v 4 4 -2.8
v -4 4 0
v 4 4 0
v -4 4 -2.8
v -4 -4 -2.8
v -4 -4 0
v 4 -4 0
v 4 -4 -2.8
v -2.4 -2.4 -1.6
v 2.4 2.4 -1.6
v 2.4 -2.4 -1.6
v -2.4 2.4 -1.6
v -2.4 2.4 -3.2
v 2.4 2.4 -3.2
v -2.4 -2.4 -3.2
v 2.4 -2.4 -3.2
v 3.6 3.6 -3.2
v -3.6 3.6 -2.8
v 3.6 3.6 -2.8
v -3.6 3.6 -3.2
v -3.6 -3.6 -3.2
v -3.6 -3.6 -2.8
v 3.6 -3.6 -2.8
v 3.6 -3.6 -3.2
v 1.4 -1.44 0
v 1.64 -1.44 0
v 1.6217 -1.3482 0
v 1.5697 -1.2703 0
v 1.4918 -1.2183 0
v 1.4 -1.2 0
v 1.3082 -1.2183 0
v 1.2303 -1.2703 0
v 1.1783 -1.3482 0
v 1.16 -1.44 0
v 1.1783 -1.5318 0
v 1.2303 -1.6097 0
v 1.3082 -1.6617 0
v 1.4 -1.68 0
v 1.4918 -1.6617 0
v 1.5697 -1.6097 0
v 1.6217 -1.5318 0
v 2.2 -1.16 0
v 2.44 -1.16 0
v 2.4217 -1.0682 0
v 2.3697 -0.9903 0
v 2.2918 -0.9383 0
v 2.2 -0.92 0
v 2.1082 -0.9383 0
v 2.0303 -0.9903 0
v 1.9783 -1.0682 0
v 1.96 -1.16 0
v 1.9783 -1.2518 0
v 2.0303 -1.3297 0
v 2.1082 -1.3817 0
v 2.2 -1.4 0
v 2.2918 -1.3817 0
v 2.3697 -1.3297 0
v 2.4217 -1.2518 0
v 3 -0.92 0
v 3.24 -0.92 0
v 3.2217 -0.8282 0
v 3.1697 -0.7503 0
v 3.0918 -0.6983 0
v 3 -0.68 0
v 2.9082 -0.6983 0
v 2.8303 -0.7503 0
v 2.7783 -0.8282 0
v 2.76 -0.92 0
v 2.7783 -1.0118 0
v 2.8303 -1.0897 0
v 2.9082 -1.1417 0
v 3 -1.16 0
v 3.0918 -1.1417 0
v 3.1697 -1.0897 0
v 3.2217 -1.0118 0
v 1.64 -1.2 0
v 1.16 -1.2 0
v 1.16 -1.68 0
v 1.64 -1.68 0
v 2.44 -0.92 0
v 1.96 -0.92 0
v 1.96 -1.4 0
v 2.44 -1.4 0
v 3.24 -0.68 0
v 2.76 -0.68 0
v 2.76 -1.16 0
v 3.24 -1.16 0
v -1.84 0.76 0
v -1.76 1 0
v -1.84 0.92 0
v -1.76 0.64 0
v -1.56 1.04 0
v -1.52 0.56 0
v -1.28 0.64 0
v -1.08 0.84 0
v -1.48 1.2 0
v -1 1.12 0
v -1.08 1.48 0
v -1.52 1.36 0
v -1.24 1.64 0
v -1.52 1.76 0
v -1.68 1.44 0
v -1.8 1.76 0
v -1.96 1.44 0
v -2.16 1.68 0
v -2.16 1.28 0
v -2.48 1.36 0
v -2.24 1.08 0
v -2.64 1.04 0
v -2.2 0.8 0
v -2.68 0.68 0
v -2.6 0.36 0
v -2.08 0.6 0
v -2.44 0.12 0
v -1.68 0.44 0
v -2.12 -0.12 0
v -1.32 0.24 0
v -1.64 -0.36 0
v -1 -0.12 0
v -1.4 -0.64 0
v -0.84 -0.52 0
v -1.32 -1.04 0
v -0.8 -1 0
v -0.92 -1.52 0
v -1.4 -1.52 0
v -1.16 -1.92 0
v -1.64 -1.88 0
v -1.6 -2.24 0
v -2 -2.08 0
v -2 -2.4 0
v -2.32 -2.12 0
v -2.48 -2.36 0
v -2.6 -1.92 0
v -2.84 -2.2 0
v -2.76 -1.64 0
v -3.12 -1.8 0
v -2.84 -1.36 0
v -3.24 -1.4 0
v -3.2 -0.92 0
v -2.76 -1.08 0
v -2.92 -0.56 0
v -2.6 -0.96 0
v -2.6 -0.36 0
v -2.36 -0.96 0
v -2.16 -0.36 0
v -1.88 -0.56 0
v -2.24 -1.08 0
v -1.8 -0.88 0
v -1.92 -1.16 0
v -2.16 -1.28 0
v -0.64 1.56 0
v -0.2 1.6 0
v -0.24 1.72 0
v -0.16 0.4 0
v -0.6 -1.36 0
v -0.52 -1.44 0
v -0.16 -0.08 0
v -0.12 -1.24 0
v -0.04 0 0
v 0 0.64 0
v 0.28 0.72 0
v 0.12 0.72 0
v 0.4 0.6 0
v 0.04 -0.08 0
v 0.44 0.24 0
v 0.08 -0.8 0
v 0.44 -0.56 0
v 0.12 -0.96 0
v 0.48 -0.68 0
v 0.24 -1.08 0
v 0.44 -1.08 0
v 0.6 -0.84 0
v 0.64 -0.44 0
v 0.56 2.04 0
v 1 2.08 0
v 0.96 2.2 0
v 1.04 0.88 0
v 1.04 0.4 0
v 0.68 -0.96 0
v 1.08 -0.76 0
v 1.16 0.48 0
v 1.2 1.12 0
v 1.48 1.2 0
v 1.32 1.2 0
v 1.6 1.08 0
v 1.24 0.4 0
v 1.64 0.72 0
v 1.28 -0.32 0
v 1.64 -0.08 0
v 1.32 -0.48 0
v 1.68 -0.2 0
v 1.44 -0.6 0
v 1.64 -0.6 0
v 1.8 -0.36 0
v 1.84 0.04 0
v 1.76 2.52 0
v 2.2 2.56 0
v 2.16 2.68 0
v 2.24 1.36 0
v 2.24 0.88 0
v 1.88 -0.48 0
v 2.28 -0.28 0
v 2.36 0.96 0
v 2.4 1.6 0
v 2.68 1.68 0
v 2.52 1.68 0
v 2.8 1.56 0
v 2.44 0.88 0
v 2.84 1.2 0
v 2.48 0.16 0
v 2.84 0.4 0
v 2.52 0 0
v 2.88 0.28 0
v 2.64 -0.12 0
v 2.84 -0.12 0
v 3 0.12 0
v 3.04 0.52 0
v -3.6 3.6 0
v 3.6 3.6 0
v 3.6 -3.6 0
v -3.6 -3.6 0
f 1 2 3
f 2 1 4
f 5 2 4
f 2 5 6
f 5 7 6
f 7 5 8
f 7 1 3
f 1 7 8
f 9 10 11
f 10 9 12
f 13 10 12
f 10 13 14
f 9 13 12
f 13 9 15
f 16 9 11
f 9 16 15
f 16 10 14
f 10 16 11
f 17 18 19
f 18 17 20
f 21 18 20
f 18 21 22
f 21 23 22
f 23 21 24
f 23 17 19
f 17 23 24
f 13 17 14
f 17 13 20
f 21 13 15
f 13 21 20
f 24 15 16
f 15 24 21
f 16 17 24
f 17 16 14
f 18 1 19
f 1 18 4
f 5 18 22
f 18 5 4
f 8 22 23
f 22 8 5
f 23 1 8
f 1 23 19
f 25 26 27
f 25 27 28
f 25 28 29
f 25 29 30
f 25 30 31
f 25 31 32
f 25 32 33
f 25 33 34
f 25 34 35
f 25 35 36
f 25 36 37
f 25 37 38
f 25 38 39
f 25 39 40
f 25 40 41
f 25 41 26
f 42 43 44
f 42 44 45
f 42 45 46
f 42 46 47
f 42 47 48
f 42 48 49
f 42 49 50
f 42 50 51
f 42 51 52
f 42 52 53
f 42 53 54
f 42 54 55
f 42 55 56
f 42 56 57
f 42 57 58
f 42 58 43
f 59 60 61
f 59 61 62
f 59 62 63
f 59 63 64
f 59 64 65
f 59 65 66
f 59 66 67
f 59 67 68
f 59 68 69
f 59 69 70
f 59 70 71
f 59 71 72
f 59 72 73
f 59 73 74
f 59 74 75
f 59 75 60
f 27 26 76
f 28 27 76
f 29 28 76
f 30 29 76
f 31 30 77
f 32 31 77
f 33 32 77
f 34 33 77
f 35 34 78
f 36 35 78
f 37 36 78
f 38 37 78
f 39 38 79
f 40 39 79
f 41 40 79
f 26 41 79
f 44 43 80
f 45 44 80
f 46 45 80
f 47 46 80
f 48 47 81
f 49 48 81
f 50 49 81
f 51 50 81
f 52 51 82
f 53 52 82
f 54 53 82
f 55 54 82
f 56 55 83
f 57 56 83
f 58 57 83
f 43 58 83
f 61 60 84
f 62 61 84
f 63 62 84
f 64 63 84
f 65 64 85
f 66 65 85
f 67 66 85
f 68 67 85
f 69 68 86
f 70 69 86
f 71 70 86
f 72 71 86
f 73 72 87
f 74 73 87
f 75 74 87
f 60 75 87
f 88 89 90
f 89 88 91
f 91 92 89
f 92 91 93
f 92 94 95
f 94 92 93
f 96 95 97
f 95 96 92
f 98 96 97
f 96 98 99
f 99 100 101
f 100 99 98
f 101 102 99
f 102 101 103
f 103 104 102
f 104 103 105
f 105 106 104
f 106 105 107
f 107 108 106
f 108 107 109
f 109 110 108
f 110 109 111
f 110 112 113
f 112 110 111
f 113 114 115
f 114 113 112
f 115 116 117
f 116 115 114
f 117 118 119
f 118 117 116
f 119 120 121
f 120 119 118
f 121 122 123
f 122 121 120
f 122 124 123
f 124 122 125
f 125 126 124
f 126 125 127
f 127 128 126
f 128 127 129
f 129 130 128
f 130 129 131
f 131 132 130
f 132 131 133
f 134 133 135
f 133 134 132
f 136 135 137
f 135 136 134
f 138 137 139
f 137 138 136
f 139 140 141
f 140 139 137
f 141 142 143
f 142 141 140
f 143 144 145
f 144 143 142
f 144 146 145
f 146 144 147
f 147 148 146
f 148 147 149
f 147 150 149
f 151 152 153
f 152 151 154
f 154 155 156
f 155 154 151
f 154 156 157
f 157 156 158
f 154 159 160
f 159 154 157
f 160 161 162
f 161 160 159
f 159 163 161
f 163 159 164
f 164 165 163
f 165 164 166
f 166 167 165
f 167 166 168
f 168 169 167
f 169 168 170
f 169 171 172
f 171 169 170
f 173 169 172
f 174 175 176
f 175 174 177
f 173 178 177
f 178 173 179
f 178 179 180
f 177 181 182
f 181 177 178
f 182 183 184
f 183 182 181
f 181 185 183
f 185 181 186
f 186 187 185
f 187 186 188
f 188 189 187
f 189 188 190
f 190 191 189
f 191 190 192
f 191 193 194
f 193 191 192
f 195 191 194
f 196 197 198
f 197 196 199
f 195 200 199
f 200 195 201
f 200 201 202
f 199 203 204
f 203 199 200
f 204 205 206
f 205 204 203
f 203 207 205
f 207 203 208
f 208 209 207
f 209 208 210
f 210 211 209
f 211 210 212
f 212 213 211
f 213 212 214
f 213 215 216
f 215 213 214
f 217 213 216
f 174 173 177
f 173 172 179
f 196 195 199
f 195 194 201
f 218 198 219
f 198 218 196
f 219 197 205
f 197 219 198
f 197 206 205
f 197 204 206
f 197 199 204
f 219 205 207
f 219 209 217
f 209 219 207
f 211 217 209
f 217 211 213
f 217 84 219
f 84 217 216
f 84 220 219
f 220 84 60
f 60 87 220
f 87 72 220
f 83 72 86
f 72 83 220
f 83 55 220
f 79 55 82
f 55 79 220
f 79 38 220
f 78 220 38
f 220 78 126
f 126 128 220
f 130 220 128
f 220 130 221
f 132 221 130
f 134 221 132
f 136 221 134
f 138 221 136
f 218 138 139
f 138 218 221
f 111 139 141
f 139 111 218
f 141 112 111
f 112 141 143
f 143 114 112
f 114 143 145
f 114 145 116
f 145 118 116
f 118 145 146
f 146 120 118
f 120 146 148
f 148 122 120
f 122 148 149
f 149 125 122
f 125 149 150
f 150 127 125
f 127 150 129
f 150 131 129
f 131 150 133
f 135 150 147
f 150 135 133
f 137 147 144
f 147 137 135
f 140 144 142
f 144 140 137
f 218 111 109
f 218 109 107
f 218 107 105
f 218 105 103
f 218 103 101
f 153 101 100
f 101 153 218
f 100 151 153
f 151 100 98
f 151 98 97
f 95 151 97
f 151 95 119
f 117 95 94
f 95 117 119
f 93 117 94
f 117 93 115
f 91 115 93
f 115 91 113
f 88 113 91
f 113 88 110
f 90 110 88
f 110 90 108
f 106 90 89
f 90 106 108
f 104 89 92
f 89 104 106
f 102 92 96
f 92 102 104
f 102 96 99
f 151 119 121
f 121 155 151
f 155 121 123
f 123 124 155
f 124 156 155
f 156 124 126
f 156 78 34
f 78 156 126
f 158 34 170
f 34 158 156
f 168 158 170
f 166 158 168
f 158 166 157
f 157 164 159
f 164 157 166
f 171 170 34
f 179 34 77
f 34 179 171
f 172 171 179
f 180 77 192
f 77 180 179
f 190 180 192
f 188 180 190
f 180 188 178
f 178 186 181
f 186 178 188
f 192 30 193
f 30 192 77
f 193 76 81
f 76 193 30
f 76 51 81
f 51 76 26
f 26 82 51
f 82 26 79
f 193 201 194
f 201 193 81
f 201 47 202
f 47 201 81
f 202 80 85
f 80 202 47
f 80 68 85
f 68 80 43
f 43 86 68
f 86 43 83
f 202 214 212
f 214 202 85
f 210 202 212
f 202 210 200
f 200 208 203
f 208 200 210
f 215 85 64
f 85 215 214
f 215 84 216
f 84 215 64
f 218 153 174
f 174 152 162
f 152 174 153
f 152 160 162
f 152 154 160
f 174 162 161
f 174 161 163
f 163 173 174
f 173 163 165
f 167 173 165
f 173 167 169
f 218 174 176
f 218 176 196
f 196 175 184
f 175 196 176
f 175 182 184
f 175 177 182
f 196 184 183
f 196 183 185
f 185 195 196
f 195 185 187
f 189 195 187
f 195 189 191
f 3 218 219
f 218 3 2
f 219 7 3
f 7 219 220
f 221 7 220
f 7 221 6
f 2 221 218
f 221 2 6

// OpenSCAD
// file: ../p/box5.scad
use <../lib.scad>
function ldraw_lib__box5() = [
// 0 Box with 5 Faces and All Edges
// 0 Name: box5.dat
// 0 Author: James Jessiman
// 0 !LDRAW_ORG Primitive UPDATE 2012-01
// 0 !LICENSE Licensed under CC BY 4.0 : see CAreadme.txt
// 
// 0 BFC CERTIFY CCW
  [0,"BFC","CERTIFY"],
  [0,"BFC","CCW"],
// 
// 0 !HISTORY 2002-04-03 [sbliss] Modified for BFC compliance
// 0 !HISTORY 2002-04-25 [PTadmin] Official Update 2002-02
// 0 !HISTORY 2007-06-24 [PTadmin] Header formatted for Contributor Agreement
// 0 !HISTORY 2008-07-01 [PTadmin] Official Update 2008-01
// 0 !HISTORY 2012-02-16 [Philo] Changed to CCW
// 0 !HISTORY 2012-03-30 [PTadmin] Official Update 2012-01
// 
// 
// 2 24 1 1 1 -1 1 1
  [2,24,1,1,1,-1,1,1],
// 2 24 -1 1 1 -1 1 -1
  [2,24,-1,1,1,-1,1,-1],
// 2 24 -1 1 -1 1 1 -1
  [2,24,-1,1,-1,1,1,-1],
// 2 24 1 1 -1 1 1 1
  [2,24,1,1,-1,1,1,1],
// 2 24 1 0 1 -1 0 1
  [2,24,1,0,1,-1,0,1],
// 2 24 -1 0 1 -1 0 -1
  [2,24,-1,0,1,-1,0,-1],
// 2 24 -1 0 -1 1 0 -1
  [2,24,-1,0,-1,1,0,-1],
// 2 24 1 0 -1 1 0 1
  [2,24,1,0,-1,1,0,1],
// 2 24 1 0 1 1 1 1
  [2,24,1,0,1,1,1,1],
// 2 24 -1 0 1 -1 1 1
  [2,24,-1,0,1,-1,1,1],
// 2 24 1 0 -1 1 1 -1
  [2,24,1,0,-1,1,1,-1],
// 2 24 -1 0 -1 -1 1 -1
  [2,24,-1,0,-1,-1,1,-1],
// 4 16 -1 1 1 1 1 1 1 1 -1 -1 1 -1
  [4,16,-1,1,1,1,1,1,1,1,-1,-1,1,-1],
// 4 16 -1 1 1 -1 0 1 1 0 1 1 1 1
  [4,16,-1,1,1,-1,0,1,1,0,1,1,1,1],
// 4 16 -1 1 -1 -1 0 -1 -1 0 1 -1 1 1
  [4,16,-1,1,-1,-1,0,-1,-1,0,1,-1,1,1],
// 4 16 1 1 -1 1 0 -1 -1 0 -1 -1 1 -1
  [4,16,1,1,-1,1,0,-1,-1,0,-1,-1,1,-1],
// 4 16 1 1 1 1 0 1 1 0 -1 1 1 -1
  [4,16,1,1,1,1,0,1,1,0,-1,1,1,-1],
];
module ldraw_lib__box5(step=0, col=false, unit=2/5, alt=false, line=0.2, solid=!$preview)
    makepoly(ldraw_lib__box5(), step=step, col=col, unit=unit, alt=alt, line=line, solid=solid);
ldraw_lib__box5(line=0.2);
// file: ../p/box4.scad
use <../lib.scad>
function ldraw_lib__box4() = [
// 0 Box with 4 Faces (2 Parallel Pairs) and All Edges
// 0 Name: box4.dat
// 0 Author: James Jessiman
// 0 !LDRAW_ORG Primitive UPDATE 2012-01
// 0 !LICENSE Licensed under CC BY 4.0 : see CAreadme.txt
// 
// 0 BFC CERTIFY CCW
  [0,"BFC","CERTIFY"],
  [0,"BFC","CCW"],
// 
// 0 !HISTORY 2002-04-03 [sbliss] Modified for BFC compliance
// 0 !HISTORY 2002-04-25 [PTadmin] Official Update 2002-02
// 0 !HISTORY 2007-06-24 [PTadmin] Header formatted for Contributor Agreement
// 0 !HISTORY 2008-07-01 [PTadmin] Official Update 2008-01
// 0 !HISTORY 2012-02-16 [Philo] Changed to CCW
// 0 !HISTORY 2012-03-30 [PTadmin] Official Update 2012-01
// 
// 
// 2 24 1 1 1 -1 1 1
  [2,24,1,1,1,-1,1,1],
// 2 24 -1 1 1 -1 1 -1
  [2,24,-1,1,1,-1,1,-1],
// 2 24 -1 1 -1 1 1 -1
  [2,24,-1,1,-1,1,1,-1],
// 2 24 1 1 -1 1 1 1
  [2,24,1,1,-1,1,1,1],
// 2 24 1 0 1 -1 0 1
  [2,24,1,0,1,-1,0,1],
// 2 24 -1 0 1 -1 0 -1
  [2,24,-1,0,1,-1,0,-1],
// 2 24 -1 0 -1 1 0 -1
  [2,24,-1,0,-1,1,0,-1],
// 2 24 1 0 -1 1 0 1
  [2,24,1,0,-1,1,0,1],
// 2 24 1 0 1 1 1 1
  [2,24,1,0,1,1,1,1],
// 2 24 -1 0 1 -1 1 1
  [2,24,-1,0,1,-1,1,1],
// 2 24 1 0 -1 1 1 -1
  [2,24,1,0,-1,1,1,-1],
// 2 24 -1 0 -1 -1 1 -1
  [2,24,-1,0,-1,-1,1,-1],
// 4 16 -1 1 1 -1 0 1 1 0 1 1 1 1
  [4,16,-1,1,1,-1,0,1,1,0,1,1,1,1],
// 4 16 -1 1 -1 -1 0 -1 -1 0 1 -1 1 1
  [4,16,-1,1,-1,-1,0,-1,-1,0,1,-1,1,1],
// 4 16 1 1 -1 1 0 -1 -1 0 -1 -1 1 -1
  [4,16,1,1,-1,1,0,-1,-1,0,-1,-1,1,-1],
// 4 16 1 1 1 1 0 1 1 0 -1 1 1 -1
  [4,16,1,1,1,1,0,1,1,0,-1,1,1,-1],
];
module ldraw_lib__box4(step=0, col=false, unit=2/5, alt=false, line=0.2, solid=!$preview)
    makepoly(ldraw_lib__box4(), step=step, col=col, unit=unit, alt=alt, line=line, solid=solid);
ldraw_lib__box4(line=0.2);
// file: s/3070bs01.scad
use <../../lib.scad>
use <../../p/box4.scad>
use <../../p/box5.scad>
function ldraw_lib__s__3070bs01() = [
// 0 ~Tile  1 x  1 with Groove without Top Face
// 0 Name: s\3070bs01.dat
// 0 Author: Chris Dee [cwdee]
// 0 !LDRAW_ORG Subpart UPDATE 2009-02
// 0 !LICENSE Licensed under CC BY 4.0 : see CAreadme.txt
// 
// 0 BFC CERTIFY CCW
  [0,"BFC","CERTIFY"],
  [0,"BFC","CCW"],
// 
// 0 !HISTORY 2009-09-03 [PTadmin] Official Update 2009-02
// 
// 
// 1 16 0 0 0 10 0 0 0 7 0 0 0 10 box4.dat
  [1,16,0,0,0,10,0,0,0,7,0,0,0,10, ldraw_lib__box4()],
// 0 BFC INVERTNEXT
  [0,"BFC","INVERTNEXT"],
// 1 16 0 8 0 6 0 0 0 -4 0 0 0 6 box5.dat
  [1,16,0,8,0,6,0,0,0,-4,0,0,0,6, ldraw_lib__box5()],
// 1 16 0 7 0 9 0 0 0 1 0 0 0 9 box4.dat
  [1,16,0,7,0,9,0,0,0,1,0,0,0,9, ldraw_lib__box4()],
// 
// 4 16 9 8 9 6 8 6 -6 8 6 -9 8 9
  [4,16,9,8,9,6,8,6,-6,8,6,-9,8,9],
// 4 16 -9 8 9 -6 8 6 -6 8 -6 -9 8 -9
  [4,16,-9,8,9,-6,8,6,-6,8,-6,-9,8,-9],
// 4 16 -9 8 -9 -6 8 -6 6 8 -6 9 8 -9
  [4,16,-9,8,-9,-6,8,-6,6,8,-6,9,8,-9],
// 4 16 9 8 -9 6 8 -6 6 8 6 9 8 9
  [4,16,9,8,-9,6,8,-6,6,8,6,9,8,9],
// 
// 4 16 10 7 10 9 7 9 -9 7 9 -10 7 10
  [4,16,10,7,10,9,7,9,-9,7,9,-10,7,10],
// 4 16 -10 7 10 -9 7 9 -9 7 -9 -10 7 -10
  [4,16,-10,7,10,-9,7,9,-9,7,-9,-10,7,-10],
// 4 16 -10 7 -10 -9 7 -9 9 7 -9 10 7 -10
  [4,16,-10,7,-10,-9,7,-9,9,7,-9,10,7,-10],
// 4 16 10 7 -10 9 7 -9 9 7 9 10 7 10
  [4,16,10,7,-10,9,7,-9,9,7,9,10,7,10],
// 0
];
module ldraw_lib__s__3070bs01(step=0, col=false, unit=2/5, alt=false, line=0.2, solid=!$preview)
    makepoly(ldraw_lib__s__3070bs01(), step=step, col=col, unit=unit, alt=alt, line=line, solid=solid);
ldraw_lib__s__3070bs01(line=0.2);
// file: ../p/4-4ndis.scad
use <../lib.scad>
function ldraw_lib__4_4ndis() = [
// 0 Disc Negative 1.0
// 0 Name: 4-4ndis.dat
// 0 Author: James Jessiman
// 0 !LDRAW_ORG Primitive UPDATE 2012-01
// 0 !LICENSE Licensed under CC BY 4.0 : see CAreadme.txt
// 
// 0 BFC CERTIFY CCW
  [0,"BFC","CERTIFY"],
  [0,"BFC","CCW"],
// 
// 0 !HISTORY 2002-03-23 [sbliss] Added BFC statement; compacted code
// 0 !HISTORY 2002-04-25 [PTadmin] Official Update 2002-02
// 0 !HISTORY 2007-06-24 [PTadmin] Header formatted for Contributor Agreement
// 0 !HISTORY 2008-07-01 [PTadmin] Official Update 2008-01
// 0 !HISTORY 2012-02-16 [Philo] Changed to CCW
// 0 !HISTORY 2012-03-30 [PTadmin] Official Update 2012-01
// 
// 
// 3 16 0.9239 0 0.3827 1 0 0 1 0 1
  [3,16,0.9239,0,0.3827,1,0,0,1,0,1],
// 3 16 0.7071 0 0.7071 0.9239 0 0.3827 1 0 1
  [3,16,0.7071,0,0.7071,0.9239,0,0.3827,1,0,1],
// 3 16 0.3827 0 0.9239 0.7071 0 0.7071 1 0 1
  [3,16,0.3827,0,0.9239,0.7071,0,0.7071,1,0,1],
// 3 16 0 0 1 0.3827 0 0.9239 1 0 1
  [3,16,0,0,1,0.3827,0,0.9239,1,0,1],
// 3 16 -0.3827 0 0.9239 0 0 1 -1 0 1
  [3,16,-0.3827,0,0.9239,0,0,1,-1,0,1],
// 3 16 -0.7071 0 0.7071 -0.3827 0 0.9239 -1 0 1
  [3,16,-0.7071,0,0.7071,-0.3827,0,0.9239,-1,0,1],
// 3 16 -0.9239 0 0.3827 -0.7071 0 0.7071 -1 0 1
  [3,16,-0.9239,0,0.3827,-0.7071,0,0.7071,-1,0,1],
// 3 16 -1 0 0 -0.9239 0 0.3827 -1 0 1
  [3,16,-1,0,0,-0.9239,0,0.3827,-1,0,1],
// 3 16 -0.9239 0 -0.3827 -1 0 0 -1 0 -1
  [3,16,-0.9239,0,-0.3827,-1,0,0,-1,0,-1],
// 3 16 -0.7071 0 -0.7071 -0.9239 0 -0.3827 -1 0 -1
  [3,16,-0.7071,0,-0.7071,-0.9239,0,-0.3827,-1,0,-1],
// 3 16 -0.3827 0 -0.9239 -0.7071 0 -0.7071 -1 0 -1
  [3,16,-0.3827,0,-0.9239,-0.7071,0,-0.7071,-1,0,-1],
// 3 16 0 0 -1 -0.3827 0 -0.9239 -1 0 -1
  [3,16,0,0,-1,-0.3827,0,-0.9239,-1,0,-1],
// 3 16 0.3827 0 -0.9239 0 0 -1 1 0 -1
  [3,16,0.3827,0,-0.9239,0,0,-1,1,0,-1],
// 3 16 0.7071 0 -0.7071 0.3827 0 -0.9239 1 0 -1
  [3,16,0.7071,0,-0.7071,0.3827,0,-0.9239,1,0,-1],
// 3 16 0.9239 0 -0.3827 0.7071 0 -0.7071 1 0 -1
  [3,16,0.9239,0,-0.3827,0.7071,0,-0.7071,1,0,-1],
// 3 16 1 0 0 0.9239 0 -0.3827 1 0 -1
  [3,16,1,0,0,0.9239,0,-0.3827,1,0,-1],
];
module ldraw_lib__4_4ndis(step=0, col=false, unit=2/5, alt=false, line=0.2, solid=!$preview)
    makepoly(ldraw_lib__4_4ndis(), step=step, col=col, unit=unit, alt=alt, line=line, solid=solid);
ldraw_lib__4_4ndis(line=0.2);
// file: ../p/4-4disc.scad
use <../lib.scad>
function ldraw_lib__4_4disc() = [
// 0 Disc 1.0
// 0 Name: 4-4disc.dat
// 0 Author: James Jessiman
// 0 !LDRAW_ORG Primitive UPDATE 2002-02
// 0 !LICENSE Licensed under CC BY 4.0 : see CAreadme.txt
// 
// 0 BFC CERTIFY CCW
  [0,"BFC","CERTIFY"],
  [0,"BFC","CCW"],
// 
// 0 !HISTORY 1998-12-15 [PTadmin] Official Update 1998-10
// 0 !HISTORY 2002-03-23 [sbliss] Added BFC statement
// 0 !HISTORY 2002-04-25 [PTadmin] Official Update 2002-02
// 0 !HISTORY 2007-06-24 [PTadmin] Header formatted for Contributor Agreement
// 0 !HISTORY 2008-07-01 [PTadmin] Official Update 2008-01
// 
// 
// 3 16 0 0 0 1 0 0 0.9239 0 0.3827
  [3,16,0,0,0,1,0,0,0.9239,0,0.3827],
// 3 16 0 0 0 0.9239 0 0.3827 0.7071 0 0.7071
  [3,16,0,0,0,0.9239,0,0.3827,0.7071,0,0.7071],
// 3 16 0 0 0 0.7071 0 0.7071 0.3827 0 0.9239
  [3,16,0,0,0,0.7071,0,0.7071,0.3827,0,0.9239],
// 3 16 0 0 0 0.3827 0 0.9239 0 0 1
  [3,16,0,0,0,0.3827,0,0.9239,0,0,1],
// 3 16 0 0 0 0 0 1 -0.3827 0 0.9239
  [3,16,0,0,0,0,0,1,-0.3827,0,0.9239],
// 3 16 0 0 0 -0.3827 0 0.9239 -0.7071 0 0.7071
  [3,16,0,0,0,-0.3827,0,0.9239,-0.7071,0,0.7071],
// 3 16 0 0 0 -0.7071 0 0.7071 -0.9239 0 0.3827
  [3,16,0,0,0,-0.7071,0,0.7071,-0.9239,0,0.3827],
// 3 16 0 0 0 -0.9239 0 0.3827 -1 0 -0
  [3,16,0,0,0,-0.9239,0,0.3827,-1,0,-0],
// 3 16 0 0 0 -1 0 -0 -0.9239 0 -0.3827
  [3,16,0,0,0,-1,0,-0,-0.9239,0,-0.3827],
// 3 16 0 0 0 -0.9239 0 -0.3827 -0.7071 0 -0.7071
  [3,16,0,0,0,-0.9239,0,-0.3827,-0.7071,0,-0.7071],
// 3 16 0 0 0 -0.7071 0 -0.7071 -0.3827 0 -0.9239
  [3,16,0,0,0,-0.7071,0,-0.7071,-0.3827,0,-0.9239],
// 3 16 0 0 0 -0.3827 0 -0.9239 0 0 -1
  [3,16,0,0,0,-0.3827,0,-0.9239,0,0,-1],
// 3 16 0 0 0 0 0 -1 0.3827 0 -0.9239
  [3,16,0,0,0,0,0,-1,0.3827,0,-0.9239],
// 3 16 0 0 0 0.3827 0 -0.9239 0.7071 0 -0.7071
  [3,16,0,0,0,0.3827,0,-0.9239,0.7071,0,-0.7071],
// 3 16 0 0 0 0.7071 0 -0.7071 0.9239 0 -0.3827
  [3,16,0,0,0,0.7071,0,-0.7071,0.9239,0,-0.3827],
// 3 16 0 0 0 0.9239 0 -0.3827 1 0 0
  [3,16,0,0,0,0.9239,0,-0.3827,1,0,0],
// 0
];
module ldraw_lib__4_4disc(step=0, col=false, unit=2/5, alt=false, line=0.2, solid=!$preview)
    makepoly(ldraw_lib__4_4disc(), step=step, col=col, unit=unit, alt=alt, line=line, solid=solid);
ldraw_lib__4_4disc(line=0.2);
// main file
use <../lib.scad>
use <../p/4-4disc.scad>
use <../p/4-4ndis.scad>
use <s/3070bs01.scad>
function ldraw_lib__3070bpt4() = [
// 0 Tile  1 x  1 with Bright Light Blue "Shhh..." on Medium Lavender Background Pattern
// 0 Name: 3070bpt4.dat
// 0 Author: Takeshi Takahashi [RainbowDolphin]
// 0 !LDRAW_ORG Part UPDATE 2025-10
// 0 !LICENSE Licensed under CC BY 4.0 : see CAreadme.txt
// 
// 0 BFC CERTIFY CCW
  [0,"BFC","CERTIFY"],
  [0,"BFC","CCW"],
// 
// 0 !KEYWORDS BrickLink 3070pb186, Dots, Extra, Rebrickable 3070bpr9989, Series 3
// 0 !KEYWORDS Set 41921
// 
// 0 !HISTORY 2025-10-27 [OrionP] Official Update 2025-10
// 
// 1 16 0 0 0 1 0 0 0 1 0 0 0 1 s\3070bs01.dat
  [1,16,0,0,0,1,0,0,0,1,0,0,0,1, ldraw_lib__s__3070bs01()],
// 1 212 3.5 0 -3.6 0.6 0 0 0 1 0 0 0 0.6 4-4disc.dat
  [1,212,3.5,0,-3.6,0.6,0,0,0,1,0,0,0,0.6, ldraw_lib__4_4disc()],
// 1 212 5.5 0 -2.9 0.6 0 0 0 1 0 0 0 0.6 4-4disc.dat
  [1,212,5.5,0,-2.9,0.6,0,0,0,1,0,0,0,0.6, ldraw_lib__4_4disc()],
// 1 212 7.5 0 -2.3 0.6 0 0 0 1 0 0 0 0.6 4-4disc.dat
  [1,212,7.5,0,-2.3,0.6,0,0,0,1,0,0,0,0.6, ldraw_lib__4_4disc()],
// 1 30 3.5 0 -3.6 0.6 0 0 0 1 0 0 0 0.6 4-4ndis.dat
  [1,30,3.5,0,-3.6,0.6,0,0,0,1,0,0,0,0.6, ldraw_lib__4_4ndis()],
// 1 30 5.5 0 -2.9 0.6 0 0 0 1 0 0 0 0.6 4-4ndis.dat
  [1,30,5.5,0,-2.9,0.6,0,0,0,1,0,0,0,0.6, ldraw_lib__4_4ndis()],
// 1 30 7.5 0 -2.3 0.6 0 0 0 1 0 0 0 0.6 4-4ndis.dat
  [1,30,7.5,0,-2.3,0.6,0,0,0,1,0,0,0,0.6, ldraw_lib__4_4ndis()],
// 4 212 -4.4 0 2.5 -4.6 0 2.3 -4.6 0 1.9 -4.4 0 1.6
  [4,212,-4.4,0,2.5,-4.6,0,2.3,-4.6,0,1.9,-4.4,0,1.6],
// 4 212 -4.4 0 2.5 -4.4 0 1.6 -3.8 0 1.4 -3.9 0 2.6
  [4,212,-4.4,0,2.5,-4.4,0,1.6,-3.8,0,1.4,-3.9,0,2.6],
// 4 212 -3.9 0 2.6 -3.8 0 1.4 -3.2 0 1.6 -2.7 0 2.1
  [4,212,-3.9,0,2.6,-3.8,0,1.4,-3.2,0,1.6,-2.7,0,2.1],
// 4 212 -3.7 0 3 -3.9 0 2.6 -2.7 0 2.1 -2.5 0 2.8
  [4,212,-3.7,0,3,-3.9,0,2.6,-2.7,0,2.1,-2.5,0,2.8],
// 4 212 -3.7 0 3 -2.5 0 2.8 -2.7 0 3.7 -3.8 0 3.4
  [4,212,-3.7,0,3,-2.5,0,2.8,-2.7,0,3.7,-3.8,0,3.4],
// 4 212 -3.8 0 3.4 -2.7 0 3.7 -3.1 0 4.1 -3.8 0 4.4
  [4,212,-3.8,0,3.4,-2.7,0,3.7,-3.1,0,4.1,-3.8,0,4.4],
// 4 212 -4.2 0 3.6 -3.8 0 3.4 -3.8 0 4.4 -4.5 0 4.4
  [4,212,-4.2,0,3.6,-3.8,0,3.4,-3.8,0,4.4,-4.5,0,4.4],
// 4 212 -4.9 0 3.6 -4.2 0 3.6 -4.5 0 4.4 -5.4 0 4.2
  [4,212,-4.9,0,3.6,-4.2,0,3.6,-4.5,0,4.4,-5.4,0,4.2],
// 4 212 -5.4 0 3.2 -4.9 0 3.6 -5.4 0 4.2 -6.2 0 3.4
  [4,212,-5.4,0,3.2,-4.9,0,3.6,-5.4,0,4.2,-6.2,0,3.4],
// 4 212 -5.6 0 2.7 -5.4 0 3.2 -6.2 0 3.4 -6.6 0 2.6
  [4,212,-5.6,0,2.7,-5.4,0,3.2,-6.2,0,3.4,-6.6,0,2.6],
// 4 212 -5.5 0 2 -5.6 0 2.7 -6.6 0 2.6 -6.7 0 1.7
  [4,212,-5.5,0,2,-5.6,0,2.7,-6.6,0,2.6,-6.7,0,1.7],
// 4 212 -5.5 0 2 -6.7 0 1.7 -6.5 0 0.9 -5.2 0 1.5
  [4,212,-5.5,0,2,-6.7,0,1.7,-6.5,0,0.9,-5.2,0,1.5],
// 4 212 -5.2 0 1.5 -6.5 0 0.9 -6.1 0 0.3 -4.2 0 1.1
  [4,212,-5.2,0,1.5,-6.5,0,0.9,-6.1,0,0.3,-4.2,0,1.1],
// 4 212 -4.2 0 1.1 -6.1 0 0.3 -5.3 0 -0.3 -3.3 0 0.6
  [4,212,-4.2,0,1.1,-6.1,0,0.3,-5.3,0,-0.3,-3.3,0,0.6],
// 4 212 -3.3 0 0.6 -5.3 0 -0.3 -4.1 0 -0.9 -2.5 0 -0.3
  [4,212,-3.3,0,0.6,-5.3,0,-0.3,-4.1,0,-0.9,-2.5,0,-0.3],
// 4 212 -2.5 0 -0.3 -4.1 0 -0.9 -3.5 0 -1.6 -2.1 0 -1.3
  [4,212,-2.5,0,-0.3,-4.1,0,-0.9,-3.5,0,-1.6,-2.1,0,-1.3],
// 4 212 -2 0 -2.5 -2.1 0 -1.3 -3.5 0 -1.6 -3.3 0 -2.6
  [4,212,-2,0,-2.5,-2.1,0,-1.3,-3.5,0,-1.6,-3.3,0,-2.6],
// 4 212 -2.3 0 -3.8 -2 0 -2.5 -3.3 0 -2.6 -3.5 0 -3.8
  [4,212,-2.3,0,-3.8,-2,0,-2.5,-3.3,0,-2.6,-3.5,0,-3.8],
// 4 212 -2.9 0 -4.8 -2.3 0 -3.8 -3.5 0 -3.8 -4.1 0 -4.7
  [4,212,-2.9,0,-4.8,-2.3,0,-3.8,-3.5,0,-3.8,-4.1,0,-4.7],
// 4 212 -4 0 -5.6 -2.9 0 -4.8 -4.1 0 -4.7 -5 0 -5.2
  [4,212,-4,0,-5.6,-2.9,0,-4.8,-4.1,0,-4.7,-5,0,-5.2],
// 4 212 -5 0 -6 -4 0 -5.6 -5 0 -5.2 -5.8 0 -5.3
  [4,212,-5,0,-6,-4,0,-5.6,-5,0,-5.2,-5.8,0,-5.3],
// 4 212 -6.2 0 -5.9 -5 0 -6 -5.8 0 -5.3 -6.5 0 -4.8
  [4,212,-6.2,0,-5.9,-5,0,-6,-5.8,0,-5.3,-6.5,0,-4.8],
// 4 212 -7.1 0 -5.5 -6.2 0 -5.9 -6.5 0 -4.8 -6.9 0 -4.1
  [4,212,-7.1,0,-5.5,-6.2,0,-5.9,-6.5,0,-4.8,-6.9,0,-4.1],
// 4 212 -7.8 0 -4.5 -7.1 0 -5.5 -6.9 0 -4.1 -7.1 0 -3.4
  [4,212,-7.8,0,-4.5,-7.1,0,-5.5,-6.9,0,-4.1,-7.1,0,-3.4],
// 4 212 -8.1 0 -3.5 -7.8 0 -4.5 -7.1 0 -3.4 -8 0 -2.3
  [4,212,-8.1,0,-3.5,-7.8,0,-4.5,-7.1,0,-3.4,-8,0,-2.3],
// 4 212 -8 0 -2.3 -7.1 0 -3.4 -6.9 0 -2.7 -7.3 0 -1.4
  [4,212,-8,0,-2.3,-7.1,0,-3.4,-6.9,0,-2.7,-7.3,0,-1.4],
// 4 212 -7.3 0 -1.4 -6.9 0 -2.7 -6.5 0 -2.4 -6.5 0 -0.9
  [4,212,-7.3,0,-1.4,-6.9,0,-2.7,-6.5,0,-2.4,-6.5,0,-0.9],
// 4 212 -6.5 0 -0.9 -6.5 0 -2.4 -5.9 0 -2.4 -5.4 0 -0.9
  [4,212,-6.5,0,-0.9,-6.5,0,-2.4,-5.9,0,-2.4,-5.4,0,-0.9],
// 4 212 -4.7 0 -1.4 -5.4 0 -0.9 -5.9 0 -2.4 -5.6 0 -2.7
  [4,212,-4.7,0,-1.4,-5.4,0,-0.9,-5.9,0,-2.4,-5.6,0,-2.7],
// 4 212 -4.5 0 -2.2 -4.7 0 -1.4 -5.6 0 -2.7 -4.8 0 -2.9
  [4,212,-4.5,0,-2.2,-4.7,0,-1.4,-5.6,0,-2.7,-4.8,0,-2.9],
// 3 212 -5.6 0 -2.7 -5.4 0 -3.2 -4.8 0 -2.9
  [3,212,-5.6,0,-2.7,-5.4,0,-3.2,-4.8,0,-2.9],
// 4 212 -0.5 0 4 -0.6 0 4.3 -1.6 0 3.9 -0.4 0 1
  [4,212,-0.5,0,4,-0.6,0,4.3,-1.6,0,3.9,-0.4,0,1],
// 4 212 -0.4 0 1 -1.6 0 3.9 -1.5 0 -3.4 -1.3 0 -3.6
  [4,212,-0.4,0,1,-1.6,0,3.9,-1.5,0,-3.4,-1.3,0,-3.6],
// 3 212 -0.4 0 1 -1.3 0 -3.6 -0.4 0 -0.2
  [3,212,-0.4,0,1,-1.3,0,-3.6,-0.4,0,-0.2],
// 3 212 -0.4 0 -0.2 -1.3 0 -3.6 -0.3 0 -3.1
  [3,212,-0.4,0,-0.2,-1.3,0,-3.6,-0.3,0,-3.1],
// 4 212 -0.4 0 1 -0.4 0 -0.2 -0.1 0 0 0 0 1.6
  [4,212,-0.4,0,1,-0.4,0,-0.2,-0.1,0,0,0,0,1.6],
// 4 212 0.3 0 1.8 0 0 1.6 -0.1 0 0 0.7 0 1.8
  [4,212,0.3,0,1.8,0,0,1.6,-0.1,0,0,0.7,0,1.8],
// 4 212 0.7 0 1.8 -0.1 0 0 0.1 0 -0.2 1 0 1.5
  [4,212,0.7,0,1.8,-0.1,0,0,0.1,0,-0.2,1,0,1.5],
// 4 212 1.1 0 0.6 1 0 1.5 0.1 0 -0.2 0.2 0 -2
  [4,212,1.1,0,0.6,1,0,1.5,0.1,0,-0.2,0.2,0,-2],
// 4 212 1.1 0 -1.4 1.1 0 0.6 0.2 0 -2 0.3 0 -2.4
  [4,212,1.1,0,-1.4,1.1,0,0.6,0.2,0,-2,0.3,0,-2.4],
// 4 212 1.2 0 -1.7 1.1 0 -1.4 0.3 0 -2.4 0.6 0 -2.7
  [4,212,1.2,0,-1.7,1.1,0,-1.4,0.3,0,-2.4,0.6,0,-2.7],
// 4 212 1.2 0 -1.7 0.6 0 -2.7 1.1 0 -2.7 1.5 0 -2.1
  [4,212,1.2,0,-1.7,0.6,0,-2.7,1.1,0,-2.7,1.5,0,-2.1],
// 3 212 1.6 0 -1.1 1.2 0 -1.7 1.5 0 -2.1
  [3,212,1.6,0,-1.1,1.2,0,-1.7,1.5,0,-2.1],
// 4 212 2.5 0 5.2 2.4 0 5.5 1.4 0 5.1 2.6 0 2.2
  [4,212,2.5,0,5.2,2.4,0,5.5,1.4,0,5.1,2.6,0,2.2],
// 4 212 1.7 0 -2.4 2.6 0 1 2.6 0 2.2 1.6 0 -1.1
  [4,212,1.7,0,-2.4,2.6,0,1,2.6,0,2.2,1.6,0,-1.1],
// 3 212 2.6 0 1 1.7 0 -2.4 2.7 0 -1.9
  [3,212,2.6,0,1,1.7,0,-2.4,2.7,0,-1.9],
// 4 212 2.6 0 2.2 2.6 0 1 2.9 0 1.2 3 0 2.8
  [4,212,2.6,0,2.2,2.6,0,1,2.9,0,1.2,3,0,2.8],
// 4 212 3.3 0 3 3 0 2.8 2.9 0 1.2 3.7 0 3
  [4,212,3.3,0,3,3,0,2.8,2.9,0,1.2,3.7,0,3],
// 4 212 3.7 0 3 2.9 0 1.2 3.1 0 1 4 0 2.7
  [4,212,3.7,0,3,2.9,0,1.2,3.1,0,1,4,0,2.7],
// 4 212 4.1 0 1.8 4 0 2.7 3.1 0 1 3.2 0 -0.8
  [4,212,4.1,0,1.8,4,0,2.7,3.1,0,1,3.2,0,-0.8],
// 4 212 4.1 0 -0.2 4.1 0 1.8 3.2 0 -0.8 3.3 0 -1.2
  [4,212,4.1,0,-0.2,4.1,0,1.8,3.2,0,-0.8,3.3,0,-1.2],
// 4 212 4.2 0 -0.5 4.1 0 -0.2 3.3 0 -1.2 3.6 0 -1.5
  [4,212,4.2,0,-0.5,4.1,0,-0.2,3.3,0,-1.2,3.6,0,-1.5],
// 4 212 4.2 0 -0.5 3.6 0 -1.5 4.1 0 -1.5 4.5 0 -0.9
  [4,212,4.2,0,-0.5,3.6,0,-1.5,4.1,0,-1.5,4.5,0,-0.9],
// 3 212 4.6 0 0.1 4.2 0 -0.5 4.5 0 -0.9
  [3,212,4.6,0,0.1,4.2,0,-0.5,4.5,0,-0.9],
// 4 212 5.5 0 6.4 5.4 0 6.7 4.4 0 6.3 5.6 0 3.4
  [4,212,5.5,0,6.4,5.4,0,6.7,4.4,0,6.3,5.6,0,3.4],
// 4 212 4.7 0 -1.2 5.6 0 2.2 5.6 0 3.4 4.6 0 0.1
  [4,212,4.7,0,-1.2,5.6,0,2.2,5.6,0,3.4,4.6,0,0.1],
// 3 212 5.6 0 2.2 4.7 0 -1.2 5.7 0 -0.7
  [3,212,5.6,0,2.2,4.7,0,-1.2,5.7,0,-0.7],
// 4 212 5.6 0 3.4 5.6 0 2.2 5.9 0 2.4 6 0 4
  [4,212,5.6,0,3.4,5.6,0,2.2,5.9,0,2.4,6,0,4],
// 4 212 6.3 0 4.2 6 0 4 5.9 0 2.4 6.7 0 4.2
  [4,212,6.3,0,4.2,6,0,4,5.9,0,2.4,6.7,0,4.2],
// 4 212 6.7 0 4.2 5.9 0 2.4 6.1 0 2.2 7 0 3.9
  [4,212,6.7,0,4.2,5.9,0,2.4,6.1,0,2.2,7,0,3.9],
// 4 212 7.1 0 3 7 0 3.9 6.1 0 2.2 6.2 0 0.4
  [4,212,7.1,0,3,7,0,3.9,6.1,0,2.2,6.2,0,0.4],
// 4 212 7.1 0 1 7.1 0 3 6.2 0 0.4 6.3 0 0
  [4,212,7.1,0,1,7.1,0,3,6.2,0,0.4,6.3,0,0],
// 4 212 7.2 0 0.7 7.1 0 1 6.3 0 0 6.6 0 -0.3
  [4,212,7.2,0,0.7,7.1,0,1,6.3,0,0,6.6,0,-0.3],
// 4 212 7.2 0 0.7 6.6 0 -0.3 7.1 0 -0.3 7.5 0 0.3
  [4,212,7.2,0,0.7,6.6,0,-0.3,7.1,0,-0.3,7.5,0,0.3],
// 3 212 7.6 0 1.3 7.2 0 0.7 7.5 0 0.3
  [3,212,7.6,0,1.3,7.2,0,0.7,7.5,0,0.3],
// 3 212 1.4 0 5.1 1.6 0 -1.1 2.6 0 2.2
  [3,212,1.4,0,5.1,1.6,0,-1.1,2.6,0,2.2],
// 3 212 1.6 0 -1.1 1.5 0 -2.1 1.7 0 -2.4
  [3,212,1.6,0,-1.1,1.5,0,-2.1,1.7,0,-2.4],
// 3 212 4.4 0 6.3 4.6 0 0.1 5.6 0 3.4
  [3,212,4.4,0,6.3,4.6,0,0.1,5.6,0,3.4],
// 3 212 4.6 0 0.1 4.5 0 -0.9 4.7 0 -1.2
  [3,212,4.6,0,0.1,4.5,0,-0.9,4.7,0,-1.2],
// 4 30 5.4 0 6.7 9 0 9 -9 0 9 4.4 0 6.3
  [4,30,5.4,0,6.7,9,0,9,-9,0,9,4.4,0,6.3],
// 4 30 9 0 9 5.4 0 6.7 5.5 0 6.4 6.7 0 4.2
  [4,30,9,0,9,5.4,0,6.7,5.5,0,6.4,6.7,0,4.2],
// 3 30 5.5 0 6.4 6.3 0 4.2 6.7 0 4.2
  [3,30,5.5,0,6.4,6.3,0,4.2,6.7,0,4.2],
// 3 30 5.5 0 6.4 6 0 4 6.3 0 4.2
  [3,30,5.5,0,6.4,6,0,4,6.3,0,4.2],
// 3 30 5.5 0 6.4 5.6 0 3.4 6 0 4
  [3,30,5.5,0,6.4,5.6,0,3.4,6,0,4],
// 3 30 9 0 9 6.7 0 4.2 7 0 3.9
  [3,30,9,0,9,6.7,0,4.2,7,0,3.9],
// 4 30 9 0 9 7 0 3.9 7.1 0 3 7.6 0 1.3
  [4,30,9,0,9,7,0,3.9,7.1,0,3,7.6,0,1.3],
// 4 30 7.6 0 1.3 7.1 0 3 7.1 0 1 7.2 0 0.7
  [4,30,7.6,0,1.3,7.1,0,3,7.1,0,1,7.2,0,0.7],
// 4 30 8.1 0 -1.7 9 0 9 7.6 0 1.3 7.5 0 0.3
  [4,30,8.1,0,-1.7,9,0,9,7.6,0,1.3,7.5,0,0.3],
// 4 30 9 0 -9 9 0 9 8.1 0 -1.7 8.1 0 -2.3
  [4,30,9,0,-9,9,0,9,8.1,0,-1.7,8.1,0,-2.3],
// 3 30 8.1 0 -2.3 8.1 0 -2.9 9 0 -9
  [3,30,8.1,0,-2.3,8.1,0,-2.9,9,0,-9],
// 3 30 8.1 0 -2.9 7.5 0 -2.9 9 0 -9
  [3,30,8.1,0,-2.9,7.5,0,-2.9,9,0,-9],
// 4 30 9 0 -9 7.5 0 -2.9 6.9 0 -2.9 6.1 0 -3.5
  [4,30,9,0,-9,7.5,0,-2.9,6.9,0,-2.9,6.1,0,-3.5],
// 3 30 6.1 0 -3.5 5.5 0 -3.5 9 0 -9
  [3,30,6.1,0,-3.5,5.5,0,-3.5,9,0,-9],
// 4 30 9 0 -9 5.5 0 -3.5 4.9 0 -3.5 4.1 0 -4.2
  [4,30,9,0,-9,5.5,0,-3.5,4.9,0,-3.5,4.1,0,-4.2],
// 3 30 4.1 0 -4.2 3.5 0 -4.2 9 0 -9
  [3,30,4.1,0,-4.2,3.5,0,-4.2,9,0,-9],
// 4 30 9 0 -9 3.5 0 -4.2 2.9 0 -4.2 -2.9 0 -4.8
  [4,30,9,0,-9,3.5,0,-4.2,2.9,0,-4.2,-2.9,0,-4.8],
// 3 30 -2.9 0 -4.8 -4 0 -5.6 9 0 -9
  [3,30,-2.9,0,-4.8,-4,0,-5.6,9,0,-9],
// 4 30 9 0 -9 -4 0 -5.6 -5 0 -6 -9 0 -9
  [4,30,9,0,-9,-4,0,-5.6,-5,0,-6,-9,0,-9],
// 3 30 -6.2 0 -5.9 -9 0 -9 -5 0 -6
  [3,30,-6.2,0,-5.9,-9,0,-9,-5,0,-6],
// 3 30 -7.1 0 -5.5 -9 0 -9 -6.2 0 -5.9
  [3,30,-7.1,0,-5.5,-9,0,-9,-6.2,0,-5.9],
// 3 30 -7.8 0 -4.5 -9 0 -9 -7.1 0 -5.5
  [3,30,-7.8,0,-4.5,-9,0,-9,-7.1,0,-5.5],
// 3 30 -8.1 0 -3.5 -9 0 -9 -7.8 0 -4.5
  [3,30,-8.1,0,-3.5,-9,0,-9,-7.8,0,-4.5],
// 4 30 -9 0 9 -9 0 -9 -8.1 0 -3.5 -8 0 -2.3
  [4,30,-9,0,9,-9,0,-9,-8.1,0,-3.5,-8,0,-2.3],
// 4 30 -9 0 9 -8 0 -2.3 -7.3 0 -1.4 -6.7 0 1.7
  [4,30,-9,0,9,-8,0,-2.3,-7.3,0,-1.4,-6.7,0,1.7],
// 4 30 -6.5 0 0.9 -6.7 0 1.7 -7.3 0 -1.4 -6.5 0 -0.9
  [4,30,-6.5,0,0.9,-6.7,0,1.7,-7.3,0,-1.4,-6.5,0,-0.9],
// 4 30 -6.1 0 0.3 -6.5 0 0.9 -6.5 0 -0.9 -5.4 0 -0.9
  [4,30,-6.1,0,0.3,-6.5,0,0.9,-6.5,0,-0.9,-5.4,0,-0.9],
// 3 30 -6.1 0 0.3 -5.4 0 -0.9 -5.3 0 -0.3
  [3,30,-6.1,0,0.3,-5.4,0,-0.9,-5.3,0,-0.3],
// 4 30 -4.1 0 -0.9 -5.3 0 -0.3 -5.4 0 -0.9 -4.7 0 -1.4
  [4,30,-4.1,0,-0.9,-5.3,0,-0.3,-5.4,0,-0.9,-4.7,0,-1.4],
// 4 30 -3.5 0 -1.6 -4.1 0 -0.9 -4.7 0 -1.4 -4.5 0 -2.2
  [4,30,-3.5,0,-1.6,-4.1,0,-0.9,-4.7,0,-1.4,-4.5,0,-2.2],
// 4 30 -3.3 0 -2.6 -3.5 0 -1.6 -4.5 0 -2.2 -4.8 0 -2.9
  [4,30,-3.3,0,-2.6,-3.5,0,-1.6,-4.5,0,-2.2,-4.8,0,-2.9],
// 4 30 -3.5 0 -3.8 -3.3 0 -2.6 -4.8 0 -2.9 -5.4 0 -3.2
  [4,30,-3.5,0,-3.8,-3.3,0,-2.6,-4.8,0,-2.9,-5.4,0,-3.2],
// 4 30 -4.1 0 -4.7 -3.5 0 -3.8 -5.4 0 -3.2 -5 0 -5.2
  [4,30,-4.1,0,-4.7,-3.5,0,-3.8,-5.4,0,-3.2,-5,0,-5.2],
// 4 30 -5.8 0 -5.3 -5 0 -5.2 -5.4 0 -3.2 -6.5 0 -4.8
  [4,30,-5.8,0,-5.3,-5,0,-5.2,-5.4,0,-3.2,-6.5,0,-4.8],
// 4 30 -6.5 0 -4.8 -5.4 0 -3.2 -5.6 0 -2.7 -6.9 0 -4.1
  [4,30,-6.5,0,-4.8,-5.4,0,-3.2,-5.6,0,-2.7,-6.9,0,-4.1],
// 4 30 -6.9 0 -4.1 -5.6 0 -2.7 -5.9 0 -2.4 -7.1 0 -3.4
  [4,30,-6.9,0,-4.1,-5.6,0,-2.7,-5.9,0,-2.4,-7.1,0,-3.4],
// 4 30 -7.1 0 -3.4 -5.9 0 -2.4 -6.5 0 -2.4 -6.9 0 -2.7
  [4,30,-7.1,0,-3.4,-5.9,0,-2.4,-6.5,0,-2.4,-6.9,0,-2.7],
// 3 30 -9 0 9 -6.7 0 1.7 -6.6 0 2.6
  [3,30,-9,0,9,-6.7,0,1.7,-6.6,0,2.6],
// 3 30 -9 0 9 -6.6 0 2.6 -6.2 0 3.4
  [3,30,-9,0,9,-6.6,0,2.6,-6.2,0,3.4],
// 3 30 -9 0 9 -6.2 0 3.4 -5.4 0 4.2
  [3,30,-9,0,9,-6.2,0,3.4,-5.4,0,4.2],
// 3 30 -9 0 9 -5.4 0 4.2 -4.5 0 4.4
  [3,30,-9,0,9,-5.4,0,4.2,-4.5,0,4.4],
// 3 30 -9 0 9 -4.5 0 4.4 -3.8 0 4.4
  [3,30,-9,0,9,-4.5,0,4.4,-3.8,0,4.4],
// 4 30 -0.6 0 4.3 -9 0 9 -3.8 0 4.4 -3.1 0 4.1
  [4,30,-0.6,0,4.3,-9,0,9,-3.8,0,4.4,-3.1,0,4.1],
// 4 30 -1.6 0 3.9 -0.6 0 4.3 -3.1 0 4.1 -2.7 0 3.7
  [4,30,-1.6,0,3.9,-0.6,0,4.3,-3.1,0,4.1,-2.7,0,3.7],
// 3 30 -1.6 0 3.9 -2.7 0 3.7 -2.5 0 2.8
  [3,30,-1.6,0,3.9,-2.7,0,3.7,-2.5,0,2.8],
// 4 30 -1.6 0 3.9 -2.5 0 2.8 -2.7 0 2.1 -2.5 0 -0.3
  [4,30,-1.6,0,3.9,-2.5,0,2.8,-2.7,0,2.1,-2.5,0,-0.3],
// 4 30 -2.5 0 -0.3 -2.7 0 2.1 -3.2 0 1.6 -3.3 0 0.6
  [4,30,-2.5,0,-0.3,-2.7,0,2.1,-3.2,0,1.6,-3.3,0,0.6],
// 4 30 -3.3 0 0.6 -3.2 0 1.6 -3.8 0 1.4 -4.2 0 1.1
  [4,30,-3.3,0,0.6,-3.2,0,1.6,-3.8,0,1.4,-4.2,0,1.1],
// 4 30 -4.2 0 1.1 -3.8 0 1.4 -4.4 0 1.6 -5.2 0 1.5
  [4,30,-4.2,0,1.1,-3.8,0,1.4,-4.4,0,1.6,-5.2,0,1.5],
// 4 30 -5.2 0 1.5 -4.4 0 1.6 -4.6 0 1.9 -5.5 0 2
  [4,30,-5.2,0,1.5,-4.4,0,1.6,-4.6,0,1.9,-5.5,0,2],
// 4 30 -5.5 0 2 -4.6 0 1.9 -4.6 0 2.3 -5.6 0 2.7
  [4,30,-5.5,0,2,-4.6,0,1.9,-4.6,0,2.3,-5.6,0,2.7],
// 4 30 -5.6 0 2.7 -4.6 0 2.3 -4.4 0 2.5 -5.4 0 3.2
  [4,30,-5.6,0,2.7,-4.6,0,2.3,-4.4,0,2.5,-5.4,0,3.2],
// 4 30 -5.4 0 3.2 -4.4 0 2.5 -3.9 0 2.6 -4.9 0 3.6
  [4,30,-5.4,0,3.2,-4.4,0,2.5,-3.9,0,2.6,-4.9,0,3.6],
// 4 30 -4.9 0 3.6 -3.9 0 2.6 -3.7 0 3 -4.2 0 3.6
  [4,30,-4.9,0,3.6,-3.9,0,2.6,-3.7,0,3,-4.2,0,3.6],
// 3 30 -4.2 0 3.6 -3.7 0 3 -3.8 0 3.4
  [3,30,-4.2,0,3.6,-3.7,0,3,-3.8,0,3.4],
// 3 30 -1.6 0 3.9 -2.5 0 -0.3 -2.1 0 -1.3
  [3,30,-1.6,0,3.9,-2.5,0,-0.3,-2.1,0,-1.3],
// 4 30 -1.6 0 3.9 -2.1 0 -1.3 -2 0 -2.5 -1.5 0 -3.4
  [4,30,-1.6,0,3.9,-2.1,0,-1.3,-2,0,-2.5,-1.5,0,-3.4],
// 3 30 -2 0 -2.5 -2.3 0 -3.8 -1.5 0 -3.4
  [3,30,-2,0,-2.5,-2.3,0,-3.8,-1.5,0,-3.4],
// 4 30 -1.3 0 -3.6 -1.5 0 -3.4 -2.3 0 -3.8 -2.9 0 -4.8
  [4,30,-1.3,0,-3.6,-1.5,0,-3.4,-2.3,0,-3.8,-2.9,0,-4.8],
// 4 30 -1.3 0 -3.6 -2.9 0 -4.8 2.9 0 -4.2 2.9 0 -3.6
  [4,30,-1.3,0,-3.6,-2.9,0,-4.8,2.9,0,-4.2,2.9,0,-3.6],
// 4 30 -0.3 0 -3.1 -1.3 0 -3.6 2.9 0 -3.6 0.6 0 -2.7
  [4,30,-0.3,0,-3.1,-1.3,0,-3.6,2.9,0,-3.6,0.6,0,-2.7],
// 3 30 0.3 0 -2.4 -0.3 0 -3.1 0.6 0 -2.7
  [3,30,0.3,0,-2.4,-0.3,0,-3.1,0.6,0,-2.7],
// 4 30 -0.3 0 -3.1 0.3 0 -2.4 0.2 0 -2 -0.4 0 -0.2
  [4,30,-0.3,0,-3.1,0.3,0,-2.4,0.2,0,-2,-0.4,0,-0.2],
// 4 30 -0.4 0 -0.2 0.2 0 -2 0.1 0 -0.2 -0.1 0 0
  [4,30,-0.4,0,-0.2,0.2,0,-2,0.1,0,-0.2,-0.1,0,0],
// 3 30 1.1 0 -2.7 0.6 0 -2.7 2.9 0 -3.6
  [3,30,1.1,0,-2.7,0.6,0,-2.7,2.9,0,-3.6],
// 4 30 1.7 0 -2.4 1.1 0 -2.7 2.9 0 -3.6 2.9 0 -3
  [4,30,1.7,0,-2.4,1.1,0,-2.7,2.9,0,-3.6,2.9,0,-3],
// 3 30 1.5 0 -2.1 1.1 0 -2.7 1.7 0 -2.4
  [3,30,1.5,0,-2.1,1.1,0,-2.7,1.7,0,-2.4],
// 4 30 2.7 0 -1.9 1.7 0 -2.4 2.9 0 -3 3.6 0 -1.5
  [4,30,2.7,0,-1.9,1.7,0,-2.4,2.9,0,-3,3.6,0,-1.5],
// 3 30 3.3 0 -1.2 2.7 0 -1.9 3.6 0 -1.5
  [3,30,3.3,0,-1.2,2.7,0,-1.9,3.6,0,-1.5],
// 4 30 2.7 0 -1.9 3.3 0 -1.2 3.2 0 -0.8 2.6 0 1
  [4,30,2.7,0,-1.9,3.3,0,-1.2,3.2,0,-0.8,2.6,0,1],
// 4 30 2.6 0 1 3.2 0 -0.8 3.1 0 1 2.9 0 1.2
  [4,30,2.6,0,1,3.2,0,-0.8,3.1,0,1,2.9,0,1.2],
// 4 30 3.6 0 -1.5 2.9 0 -3 3.5 0 -3 4.1 0 -1.5
  [4,30,3.6,0,-1.5,2.9,0,-3,3.5,0,-3,4.1,0,-1.5],
// 4 30 4.1 0 -1.5 3.5 0 -3 4.1 0 -3 4.9 0 -2.3
  [4,30,4.1,0,-1.5,3.5,0,-3,4.1,0,-3,4.9,0,-2.3],
// 4 30 4.9 0 -2.9 4.9 0 -2.3 4.1 0 -3 4.1 0 -3.6
  [4,30,4.9,0,-2.9,4.9,0,-2.3,4.1,0,-3,4.1,0,-3.6],
// 4 30 4.9 0 -3.5 4.9 0 -2.9 4.1 0 -3.6 4.1 0 -4.2
  [4,30,4.9,0,-3.5,4.9,0,-2.9,4.1,0,-3.6,4.1,0,-4.2],
// 4 30 4.1 0 -1.5 4.9 0 -2.3 4.7 0 -1.2 4.5 0 -0.9
  [4,30,4.1,0,-1.5,4.9,0,-2.3,4.7,0,-1.2,4.5,0,-0.9],
// 4 30 4.7 0 -1.2 4.9 0 -2.3 5.5 0 -2.3 5.7 0 -0.7
  [4,30,4.7,0,-1.2,4.9,0,-2.3,5.5,0,-2.3,5.7,0,-0.7],
// 4 30 5.7 0 -0.7 5.5 0 -2.3 6.1 0 -2.3 6.9 0 -1.7
  [4,30,5.7,0,-0.7,5.5,0,-2.3,6.1,0,-2.3,6.9,0,-1.7],
// 4 30 6.9 0 -2.3 6.9 0 -1.7 6.1 0 -2.3 6.1 0 -2.9
  [4,30,6.9,0,-2.3,6.9,0,-1.7,6.1,0,-2.3,6.1,0,-2.9],
// 4 30 6.9 0 -2.9 6.9 0 -2.3 6.1 0 -2.9 6.1 0 -3.5
  [4,30,6.9,0,-2.9,6.9,0,-2.3,6.1,0,-2.9,6.1,0,-3.5],
// 4 30 5.7 0 -0.7 6.9 0 -1.7 6.6 0 -0.3 6.3 0 0
  [4,30,5.7,0,-0.7,6.9,0,-1.7,6.6,0,-0.3,6.3,0,0],
// 4 30 5.7 0 -0.7 6.3 0 0 6.2 0 0.4 5.6 0 2.2
  [4,30,5.7,0,-0.7,6.3,0,0,6.2,0,0.4,5.6,0,2.2],
// 4 30 5.6 0 2.2 6.2 0 0.4 6.1 0 2.2 5.9 0 2.4
  [4,30,5.6,0,2.2,6.2,0,0.4,6.1,0,2.2,5.9,0,2.4],
// 4 30 7.1 0 -0.3 6.6 0 -0.3 6.9 0 -1.7 7.5 0 -1.7
  [4,30,7.1,0,-0.3,6.6,0,-0.3,6.9,0,-1.7,7.5,0,-1.7],
// 4 30 7.5 0 0.3 7.1 0 -0.3 7.5 0 -1.7 8.1 0 -1.7
  [4,30,7.5,0,0.3,7.1,0,-0.3,7.5,0,-1.7,8.1,0,-1.7],
// 3 30 -9 0 9 -0.6 0 4.3 1.4 0 5.1
  [3,30,-9,0,9,-0.6,0,4.3,1.4,0,5.1],
// 4 30 1.4 0 5.1 -0.6 0 4.3 -0.5 0 4 0.3 0 1.8
  [4,30,1.4,0,5.1,-0.6,0,4.3,-0.5,0,4,0.3,0,1.8],
// 3 30 -0.5 0 4 0 0 1.6 0.3 0 1.8
  [3,30,-0.5,0,4,0,0,1.6,0.3,0,1.8],
// 3 30 -0.5 0 4 -0.4 0 1 0 0 1.6
  [3,30,-0.5,0,4,-0.4,0,1,0,0,1.6],
// 3 30 1.4 0 5.1 0.3 0 1.8 0.7 0 1.8
  [3,30,1.4,0,5.1,0.3,0,1.8,0.7,0,1.8],
// 3 30 1.4 0 5.1 0.7 0 1.8 1 0 1.5
  [3,30,1.4,0,5.1,0.7,0,1.8,1,0,1.5],
// 4 30 1.4 0 5.1 1 0 1.5 1.1 0 0.6 1.6 0 -1.1
  [4,30,1.4,0,5.1,1,0,1.5,1.1,0,0.6,1.6,0,-1.1],
// 4 30 1.6 0 -1.1 1.1 0 0.6 1.1 0 -1.4 1.2 0 -1.7
  [4,30,1.6,0,-1.1,1.1,0,0.6,1.1,0,-1.4,1.2,0,-1.7],
// 3 30 -9 0 9 1.4 0 5.1 2.4 0 5.5
  [3,30,-9,0,9,1.4,0,5.1,2.4,0,5.5],
// 3 30 -9 0 9 2.4 0 5.5 4.4 0 6.3
  [3,30,-9,0,9,2.4,0,5.5,4.4,0,6.3],
// 4 30 4.4 0 6.3 2.4 0 5.5 2.5 0 5.2 3.3 0 3
  [4,30,4.4,0,6.3,2.4,0,5.5,2.5,0,5.2,3.3,0,3],
// 3 30 2.5 0 5.2 3 0 2.8 3.3 0 3
  [3,30,2.5,0,5.2,3,0,2.8,3.3,0,3],
// 3 30 2.5 0 5.2 2.6 0 2.2 3 0 2.8
  [3,30,2.5,0,5.2,2.6,0,2.2,3,0,2.8],
// 3 30 4.4 0 6.3 3.3 0 3 3.7 0 3
  [3,30,4.4,0,6.3,3.3,0,3,3.7,0,3],
// 3 30 4.4 0 6.3 3.7 0 3 4 0 2.7
  [3,30,4.4,0,6.3,3.7,0,3,4,0,2.7],
// 4 30 4.4 0 6.3 4 0 2.7 4.1 0 1.8 4.6 0 0.1
  [4,30,4.4,0,6.3,4,0,2.7,4.1,0,1.8,4.6,0,0.1],
// 4 30 4.6 0 0.1 4.1 0 1.8 4.1 0 -0.2 4.2 0 -0.5
  [4,30,4.6,0,0.1,4.1,0,1.8,4.1,0,-0.2,4.2,0,-0.5],
// 4 16 -10 0 10 -9 0 9 9 0 9 10 0 10
  [4,16,-10,0,10,-9,0,9,9,0,9,10,0,10],
// 4 16 10 0 -10 10 0 10 9 0 9 9 0 -9
  [4,16,10,0,-10,10,0,10,9,0,9,9,0,-9],
// 4 16 -10 0 -10 10 0 -10 9 0 -9 -9 0 -9
  [4,16,-10,0,-10,10,0,-10,9,0,-9,-9,0,-9],
// 4 16 -10 0 10 -10 0 -10 -9 0 -9 -9 0 9
  [4,16,-10,0,10,-10,0,-10,-9,0,-9,-9,0,9],
];
module ldraw_lib__3070bpt4(step=0, col=false, unit=2/5, alt=false, line=0.2, solid=!$preview)
    makepoly(ldraw_lib__3070bpt4(), step=step, col=col, unit=unit, alt=alt, line=line, solid=solid);
ldraw_lib__3070bpt4(line=0.2);
